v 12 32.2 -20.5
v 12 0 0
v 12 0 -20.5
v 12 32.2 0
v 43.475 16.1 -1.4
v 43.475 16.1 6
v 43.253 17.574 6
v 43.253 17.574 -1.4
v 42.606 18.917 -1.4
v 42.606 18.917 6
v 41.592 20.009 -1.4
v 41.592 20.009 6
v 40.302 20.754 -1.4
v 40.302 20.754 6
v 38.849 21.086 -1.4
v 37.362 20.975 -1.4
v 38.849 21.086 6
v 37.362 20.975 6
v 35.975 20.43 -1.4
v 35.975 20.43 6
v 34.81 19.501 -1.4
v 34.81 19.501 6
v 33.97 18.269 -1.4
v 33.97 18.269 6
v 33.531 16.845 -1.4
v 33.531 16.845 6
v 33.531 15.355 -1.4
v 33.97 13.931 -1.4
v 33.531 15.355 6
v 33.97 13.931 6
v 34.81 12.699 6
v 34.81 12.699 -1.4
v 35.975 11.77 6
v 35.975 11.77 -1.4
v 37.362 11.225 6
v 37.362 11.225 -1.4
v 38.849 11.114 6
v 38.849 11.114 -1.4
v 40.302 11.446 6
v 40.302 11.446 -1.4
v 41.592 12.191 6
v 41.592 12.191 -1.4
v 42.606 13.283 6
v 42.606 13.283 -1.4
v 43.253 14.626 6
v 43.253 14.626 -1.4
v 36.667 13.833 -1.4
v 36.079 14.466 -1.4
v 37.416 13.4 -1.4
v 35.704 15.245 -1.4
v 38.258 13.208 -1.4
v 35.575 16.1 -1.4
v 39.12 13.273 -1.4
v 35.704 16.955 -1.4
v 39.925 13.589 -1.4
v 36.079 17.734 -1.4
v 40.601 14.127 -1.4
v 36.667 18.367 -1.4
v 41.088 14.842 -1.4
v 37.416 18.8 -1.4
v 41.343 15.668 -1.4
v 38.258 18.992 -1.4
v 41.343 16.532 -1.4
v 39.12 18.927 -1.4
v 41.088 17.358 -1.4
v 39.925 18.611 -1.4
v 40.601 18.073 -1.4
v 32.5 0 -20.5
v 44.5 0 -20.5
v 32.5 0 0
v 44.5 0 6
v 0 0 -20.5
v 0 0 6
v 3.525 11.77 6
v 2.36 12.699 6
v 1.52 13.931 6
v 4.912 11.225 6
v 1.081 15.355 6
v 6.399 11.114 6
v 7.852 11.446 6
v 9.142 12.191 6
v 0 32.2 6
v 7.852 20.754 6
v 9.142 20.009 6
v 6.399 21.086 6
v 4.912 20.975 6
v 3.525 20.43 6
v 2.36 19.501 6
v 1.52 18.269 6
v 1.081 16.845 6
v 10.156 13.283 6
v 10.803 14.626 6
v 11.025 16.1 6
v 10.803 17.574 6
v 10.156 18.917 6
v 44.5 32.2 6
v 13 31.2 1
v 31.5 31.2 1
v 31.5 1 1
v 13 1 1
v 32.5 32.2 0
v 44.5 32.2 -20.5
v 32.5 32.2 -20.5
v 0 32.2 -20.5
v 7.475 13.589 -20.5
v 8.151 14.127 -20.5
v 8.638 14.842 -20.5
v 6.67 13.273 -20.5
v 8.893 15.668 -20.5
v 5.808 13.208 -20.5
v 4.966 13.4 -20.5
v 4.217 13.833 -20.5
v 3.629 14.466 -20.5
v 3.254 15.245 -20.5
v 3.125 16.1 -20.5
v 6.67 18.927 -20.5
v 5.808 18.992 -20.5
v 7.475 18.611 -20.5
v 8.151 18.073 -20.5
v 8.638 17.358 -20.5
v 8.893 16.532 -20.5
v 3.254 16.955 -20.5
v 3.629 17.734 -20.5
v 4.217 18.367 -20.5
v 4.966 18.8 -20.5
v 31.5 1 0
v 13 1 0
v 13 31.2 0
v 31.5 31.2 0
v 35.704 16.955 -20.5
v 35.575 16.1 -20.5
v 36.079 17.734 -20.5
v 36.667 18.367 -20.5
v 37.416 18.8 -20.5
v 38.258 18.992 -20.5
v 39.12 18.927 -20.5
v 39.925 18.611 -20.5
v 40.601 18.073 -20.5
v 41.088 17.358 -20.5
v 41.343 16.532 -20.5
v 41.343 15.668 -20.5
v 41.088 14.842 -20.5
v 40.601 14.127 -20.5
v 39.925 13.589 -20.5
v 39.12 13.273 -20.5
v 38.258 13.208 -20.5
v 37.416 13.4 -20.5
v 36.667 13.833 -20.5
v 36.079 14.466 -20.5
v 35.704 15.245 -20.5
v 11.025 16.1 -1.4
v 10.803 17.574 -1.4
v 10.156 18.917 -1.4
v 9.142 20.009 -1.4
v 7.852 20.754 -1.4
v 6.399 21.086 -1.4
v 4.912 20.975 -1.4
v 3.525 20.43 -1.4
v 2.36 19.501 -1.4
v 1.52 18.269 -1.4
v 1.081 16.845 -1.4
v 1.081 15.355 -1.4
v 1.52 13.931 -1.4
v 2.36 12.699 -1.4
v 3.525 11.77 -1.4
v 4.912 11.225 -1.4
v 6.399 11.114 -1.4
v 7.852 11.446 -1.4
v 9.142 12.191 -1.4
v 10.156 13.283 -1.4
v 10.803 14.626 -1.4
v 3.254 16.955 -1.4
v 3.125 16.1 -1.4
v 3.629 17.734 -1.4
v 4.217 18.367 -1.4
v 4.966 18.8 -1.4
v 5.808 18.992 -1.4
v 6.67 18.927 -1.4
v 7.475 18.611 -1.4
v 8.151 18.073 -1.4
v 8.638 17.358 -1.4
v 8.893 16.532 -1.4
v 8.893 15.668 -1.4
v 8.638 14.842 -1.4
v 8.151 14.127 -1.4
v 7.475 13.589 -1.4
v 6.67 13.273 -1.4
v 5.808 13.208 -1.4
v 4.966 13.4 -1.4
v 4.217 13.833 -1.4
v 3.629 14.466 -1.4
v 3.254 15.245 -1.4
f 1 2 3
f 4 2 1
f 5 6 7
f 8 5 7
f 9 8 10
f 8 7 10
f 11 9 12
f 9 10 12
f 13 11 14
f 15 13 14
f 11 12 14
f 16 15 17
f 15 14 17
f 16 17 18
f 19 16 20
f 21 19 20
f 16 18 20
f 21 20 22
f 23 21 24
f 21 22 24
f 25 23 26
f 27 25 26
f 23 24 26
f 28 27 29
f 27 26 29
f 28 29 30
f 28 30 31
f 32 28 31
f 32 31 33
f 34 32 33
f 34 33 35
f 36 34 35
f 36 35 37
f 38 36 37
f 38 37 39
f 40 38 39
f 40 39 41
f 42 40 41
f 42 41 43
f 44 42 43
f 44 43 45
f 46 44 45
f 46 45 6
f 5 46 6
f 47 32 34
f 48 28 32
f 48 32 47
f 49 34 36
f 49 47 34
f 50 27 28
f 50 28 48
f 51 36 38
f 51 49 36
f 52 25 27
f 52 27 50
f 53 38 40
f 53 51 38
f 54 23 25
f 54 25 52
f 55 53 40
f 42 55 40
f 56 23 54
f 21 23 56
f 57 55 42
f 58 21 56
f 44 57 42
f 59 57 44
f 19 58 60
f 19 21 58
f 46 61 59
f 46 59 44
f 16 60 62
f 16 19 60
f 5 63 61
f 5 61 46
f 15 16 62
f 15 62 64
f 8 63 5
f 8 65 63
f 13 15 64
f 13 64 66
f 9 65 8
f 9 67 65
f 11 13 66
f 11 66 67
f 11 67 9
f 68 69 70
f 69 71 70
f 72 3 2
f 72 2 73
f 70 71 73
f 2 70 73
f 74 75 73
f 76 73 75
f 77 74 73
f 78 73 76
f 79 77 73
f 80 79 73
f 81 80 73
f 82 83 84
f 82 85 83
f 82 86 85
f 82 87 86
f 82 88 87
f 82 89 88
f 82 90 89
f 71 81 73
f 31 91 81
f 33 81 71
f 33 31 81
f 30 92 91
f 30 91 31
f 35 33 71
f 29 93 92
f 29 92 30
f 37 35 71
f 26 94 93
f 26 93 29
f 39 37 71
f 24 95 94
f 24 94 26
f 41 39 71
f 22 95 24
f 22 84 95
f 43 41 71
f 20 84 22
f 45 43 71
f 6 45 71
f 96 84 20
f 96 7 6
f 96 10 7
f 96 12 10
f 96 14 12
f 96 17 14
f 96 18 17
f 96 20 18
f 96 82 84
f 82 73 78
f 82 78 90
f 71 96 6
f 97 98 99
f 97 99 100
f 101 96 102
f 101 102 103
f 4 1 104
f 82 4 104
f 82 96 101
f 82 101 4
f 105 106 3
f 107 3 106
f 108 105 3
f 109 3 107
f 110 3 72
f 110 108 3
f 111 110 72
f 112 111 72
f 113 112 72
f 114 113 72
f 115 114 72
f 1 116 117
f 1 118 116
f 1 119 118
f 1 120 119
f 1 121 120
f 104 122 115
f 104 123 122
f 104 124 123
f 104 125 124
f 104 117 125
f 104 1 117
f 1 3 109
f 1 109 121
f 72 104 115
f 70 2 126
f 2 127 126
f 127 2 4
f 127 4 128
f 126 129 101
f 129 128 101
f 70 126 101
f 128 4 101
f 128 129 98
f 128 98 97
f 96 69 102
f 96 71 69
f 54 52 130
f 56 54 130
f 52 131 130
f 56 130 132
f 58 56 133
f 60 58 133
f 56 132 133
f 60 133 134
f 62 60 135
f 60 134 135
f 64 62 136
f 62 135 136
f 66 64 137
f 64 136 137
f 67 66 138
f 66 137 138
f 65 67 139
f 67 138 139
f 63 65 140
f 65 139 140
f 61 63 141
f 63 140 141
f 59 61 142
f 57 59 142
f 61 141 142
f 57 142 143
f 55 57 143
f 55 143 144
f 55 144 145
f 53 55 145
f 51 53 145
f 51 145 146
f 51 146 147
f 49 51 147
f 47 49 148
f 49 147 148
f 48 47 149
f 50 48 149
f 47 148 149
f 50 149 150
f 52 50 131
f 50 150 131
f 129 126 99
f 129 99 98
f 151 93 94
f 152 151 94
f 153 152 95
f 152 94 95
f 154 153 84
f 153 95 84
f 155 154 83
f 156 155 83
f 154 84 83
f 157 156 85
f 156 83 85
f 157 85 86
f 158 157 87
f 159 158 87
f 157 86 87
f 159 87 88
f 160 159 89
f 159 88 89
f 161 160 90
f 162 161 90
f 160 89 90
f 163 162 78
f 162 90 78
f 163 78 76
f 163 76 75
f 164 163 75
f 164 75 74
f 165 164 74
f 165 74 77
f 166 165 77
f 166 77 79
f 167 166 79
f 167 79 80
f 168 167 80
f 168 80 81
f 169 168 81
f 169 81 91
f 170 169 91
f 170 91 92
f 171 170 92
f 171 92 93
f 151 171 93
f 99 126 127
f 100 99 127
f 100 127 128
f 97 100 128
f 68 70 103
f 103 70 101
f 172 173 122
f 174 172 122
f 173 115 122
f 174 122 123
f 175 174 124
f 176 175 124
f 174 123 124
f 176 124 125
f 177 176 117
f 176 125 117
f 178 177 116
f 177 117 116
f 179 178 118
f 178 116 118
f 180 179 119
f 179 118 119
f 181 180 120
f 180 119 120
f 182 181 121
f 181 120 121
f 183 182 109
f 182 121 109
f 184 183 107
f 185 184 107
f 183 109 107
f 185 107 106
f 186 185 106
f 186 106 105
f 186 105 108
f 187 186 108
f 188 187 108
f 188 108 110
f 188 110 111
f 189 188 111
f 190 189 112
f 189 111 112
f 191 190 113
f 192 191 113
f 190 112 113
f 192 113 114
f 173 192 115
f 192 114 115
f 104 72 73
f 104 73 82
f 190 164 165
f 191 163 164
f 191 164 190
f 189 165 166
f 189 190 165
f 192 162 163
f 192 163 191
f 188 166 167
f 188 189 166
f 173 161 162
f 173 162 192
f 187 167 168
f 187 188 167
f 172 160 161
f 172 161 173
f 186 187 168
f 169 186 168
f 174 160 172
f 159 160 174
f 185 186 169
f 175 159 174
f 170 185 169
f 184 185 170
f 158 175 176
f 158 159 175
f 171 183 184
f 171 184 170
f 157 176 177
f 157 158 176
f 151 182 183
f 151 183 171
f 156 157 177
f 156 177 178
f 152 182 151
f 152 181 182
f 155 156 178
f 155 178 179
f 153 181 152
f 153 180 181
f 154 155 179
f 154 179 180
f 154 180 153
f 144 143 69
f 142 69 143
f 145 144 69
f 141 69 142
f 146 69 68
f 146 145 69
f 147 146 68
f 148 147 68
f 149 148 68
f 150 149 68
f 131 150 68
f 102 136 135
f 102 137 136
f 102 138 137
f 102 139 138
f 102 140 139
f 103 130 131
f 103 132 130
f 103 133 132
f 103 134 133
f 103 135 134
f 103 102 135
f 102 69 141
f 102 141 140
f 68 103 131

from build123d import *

# Parameters (mm, degrees)
SKETCH1_W                                           = 44.5
SKETCH1_H                                           = 32.2
BOSS_EXTRUDE1_DEPTH                                 = 6
SKETCH2_W                                           = 12
SKETCH2_H                                           = 32.2
BOSS_EXTRUDE2_DEPTH                                 = 20.5
CBORE_FOR_M5_HEX_SOCKET_HEAD_CAP_SCREW1_D           = 5.8
CBORE_FOR_M5_HEX_SOCKET_HEAD_CAP_SCREW1_CBORE_D     = 10
CBORE_FOR_M5_HEX_SOCKET_HEAD_CAP_SCREW1_CBORE_DEPTH = 7.4
SKETCH6_W                                           = 18.5
SKETCH6_H                                           = 30.2
CUT_EXTRUDE1_DEPTH                                  = 1


with BuildPart() as part:
    # Sketch1 → Boss-Extrude1 (new body)
    with BuildSketch(Plane.XY):
        with Locations((22.25, 16.1)):
            Rectangle(SKETCH1_W, SKETCH1_H)
    extrude(amount=BOSS_EXTRUDE1_DEPTH)

    # Sketch2 → Boss-Extrude2 (add)
    with BuildSketch(Plane(origin=(0, 0, 0), x_dir=(-1, 0, 0), z_dir=(0, 0, -1))):
        with Locations((-38.5, 16.1)):
            Rectangle(SKETCH2_W, SKETCH2_H)
        with Locations((-6, 16.1)):
            Rectangle(SKETCH2_W, SKETCH2_H)
    extrude(amount=BOSS_EXTRUDE2_DEPTH)

    # CBORE for M5 Hex Socket Head Cap Screw1 (through all)
    with Locations(Plane.XY.offset(6)):
        with Locations((6.025, 16.1), (38.475, 16.1)):
            CounterBoreHole(CBORE_FOR_M5_HEX_SOCKET_HEAD_CAP_SCREW1_D / 2, CBORE_FOR_M5_HEX_SOCKET_HEAD_CAP_SCREW1_CBORE_D / 2, CBORE_FOR_M5_HEX_SOCKET_HEAD_CAP_SCREW1_CBORE_DEPTH)

    # Sketch6 → Cut-Extrude1 (cut)
    with BuildSketch(Plane(origin=(0, 0, 0), x_dir=(-1, 0, 0), z_dir=(0, 0, -1))):
        with Locations((-22.25, 16.1)):
            Rectangle(SKETCH6_W, SKETCH6_H)
    extrude(amount=-CUT_EXTRUDE1_DEPTH, mode=Mode.SUBTRACT)


solid = part.part
